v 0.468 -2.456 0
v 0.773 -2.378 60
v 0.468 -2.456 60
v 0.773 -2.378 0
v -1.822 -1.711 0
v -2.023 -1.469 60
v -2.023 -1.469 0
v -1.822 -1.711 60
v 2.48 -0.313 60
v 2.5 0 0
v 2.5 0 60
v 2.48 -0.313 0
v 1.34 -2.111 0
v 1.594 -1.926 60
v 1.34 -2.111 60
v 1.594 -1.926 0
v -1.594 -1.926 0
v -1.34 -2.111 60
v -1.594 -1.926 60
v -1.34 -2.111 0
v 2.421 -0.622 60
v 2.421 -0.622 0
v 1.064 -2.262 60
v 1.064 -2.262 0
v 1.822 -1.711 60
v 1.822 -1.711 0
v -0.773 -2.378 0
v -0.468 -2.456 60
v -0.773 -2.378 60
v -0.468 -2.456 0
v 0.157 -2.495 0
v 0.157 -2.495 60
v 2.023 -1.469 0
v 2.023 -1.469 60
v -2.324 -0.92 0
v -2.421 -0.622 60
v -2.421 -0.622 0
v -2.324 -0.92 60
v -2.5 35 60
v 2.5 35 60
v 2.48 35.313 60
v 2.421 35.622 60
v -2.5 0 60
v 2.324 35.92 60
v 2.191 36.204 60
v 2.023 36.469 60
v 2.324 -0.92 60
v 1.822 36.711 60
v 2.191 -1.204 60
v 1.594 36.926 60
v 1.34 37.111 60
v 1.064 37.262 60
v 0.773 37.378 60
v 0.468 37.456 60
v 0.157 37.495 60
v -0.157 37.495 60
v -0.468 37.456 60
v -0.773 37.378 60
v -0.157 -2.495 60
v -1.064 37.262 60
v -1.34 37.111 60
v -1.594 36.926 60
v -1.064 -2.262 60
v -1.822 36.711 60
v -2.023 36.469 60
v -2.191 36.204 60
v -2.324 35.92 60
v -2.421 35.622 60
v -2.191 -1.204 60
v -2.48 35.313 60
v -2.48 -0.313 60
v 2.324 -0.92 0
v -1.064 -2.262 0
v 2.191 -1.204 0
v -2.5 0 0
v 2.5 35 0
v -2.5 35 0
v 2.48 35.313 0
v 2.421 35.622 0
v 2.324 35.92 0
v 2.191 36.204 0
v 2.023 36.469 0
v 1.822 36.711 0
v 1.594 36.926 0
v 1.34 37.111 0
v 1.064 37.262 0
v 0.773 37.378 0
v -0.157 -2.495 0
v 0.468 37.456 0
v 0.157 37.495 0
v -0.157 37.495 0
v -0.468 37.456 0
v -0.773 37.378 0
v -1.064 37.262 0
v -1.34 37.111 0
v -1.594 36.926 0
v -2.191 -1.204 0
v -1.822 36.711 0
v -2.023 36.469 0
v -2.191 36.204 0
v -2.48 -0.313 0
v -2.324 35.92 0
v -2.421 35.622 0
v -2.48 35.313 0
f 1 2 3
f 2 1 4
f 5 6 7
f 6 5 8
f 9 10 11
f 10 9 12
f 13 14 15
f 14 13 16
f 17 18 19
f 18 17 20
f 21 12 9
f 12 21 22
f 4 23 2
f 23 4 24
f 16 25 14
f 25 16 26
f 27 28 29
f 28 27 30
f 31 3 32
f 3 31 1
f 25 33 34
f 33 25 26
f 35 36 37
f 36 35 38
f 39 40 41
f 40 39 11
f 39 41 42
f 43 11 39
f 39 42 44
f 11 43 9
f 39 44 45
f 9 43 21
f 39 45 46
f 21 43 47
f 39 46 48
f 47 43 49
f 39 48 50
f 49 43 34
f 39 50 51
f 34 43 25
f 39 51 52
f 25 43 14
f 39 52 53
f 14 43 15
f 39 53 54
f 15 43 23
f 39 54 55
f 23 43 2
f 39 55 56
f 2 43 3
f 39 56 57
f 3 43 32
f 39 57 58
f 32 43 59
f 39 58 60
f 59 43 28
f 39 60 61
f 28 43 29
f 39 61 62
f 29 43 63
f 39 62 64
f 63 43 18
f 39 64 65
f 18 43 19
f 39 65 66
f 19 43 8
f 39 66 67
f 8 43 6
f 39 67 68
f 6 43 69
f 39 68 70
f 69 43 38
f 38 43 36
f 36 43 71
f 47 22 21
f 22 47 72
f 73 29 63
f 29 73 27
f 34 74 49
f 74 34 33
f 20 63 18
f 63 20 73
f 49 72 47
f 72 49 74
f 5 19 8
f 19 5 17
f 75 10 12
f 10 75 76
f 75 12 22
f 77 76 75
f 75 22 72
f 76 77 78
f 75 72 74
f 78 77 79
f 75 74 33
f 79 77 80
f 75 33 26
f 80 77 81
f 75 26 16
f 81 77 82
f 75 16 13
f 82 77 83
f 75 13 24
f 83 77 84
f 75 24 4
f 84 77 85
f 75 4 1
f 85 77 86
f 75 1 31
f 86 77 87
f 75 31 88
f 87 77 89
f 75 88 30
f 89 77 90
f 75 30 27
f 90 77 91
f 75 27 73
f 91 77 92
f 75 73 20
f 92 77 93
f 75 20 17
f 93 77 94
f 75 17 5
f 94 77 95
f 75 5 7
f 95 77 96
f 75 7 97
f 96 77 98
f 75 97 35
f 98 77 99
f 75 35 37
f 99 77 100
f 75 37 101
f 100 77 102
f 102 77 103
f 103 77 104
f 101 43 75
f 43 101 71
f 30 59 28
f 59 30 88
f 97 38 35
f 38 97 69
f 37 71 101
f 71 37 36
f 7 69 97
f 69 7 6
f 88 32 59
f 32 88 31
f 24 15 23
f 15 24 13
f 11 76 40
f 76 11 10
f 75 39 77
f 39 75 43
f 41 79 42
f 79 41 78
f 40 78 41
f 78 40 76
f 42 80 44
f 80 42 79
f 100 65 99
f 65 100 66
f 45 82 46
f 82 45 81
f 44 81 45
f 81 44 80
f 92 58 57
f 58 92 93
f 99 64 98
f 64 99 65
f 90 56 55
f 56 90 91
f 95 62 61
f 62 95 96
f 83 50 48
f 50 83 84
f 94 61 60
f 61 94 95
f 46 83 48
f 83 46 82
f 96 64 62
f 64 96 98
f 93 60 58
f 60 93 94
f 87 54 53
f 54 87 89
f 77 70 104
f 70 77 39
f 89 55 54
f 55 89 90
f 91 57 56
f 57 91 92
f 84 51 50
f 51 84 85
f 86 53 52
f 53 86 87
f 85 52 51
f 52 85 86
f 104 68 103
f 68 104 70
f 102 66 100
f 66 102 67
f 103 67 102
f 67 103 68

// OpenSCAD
$fn=50;

cylinder(r=2.5,h=60);
translate([-2.5,0,0]) cube([5,35,60],center=false);
translate([0,35,0]) cylinder(r=2.5,h=60);
